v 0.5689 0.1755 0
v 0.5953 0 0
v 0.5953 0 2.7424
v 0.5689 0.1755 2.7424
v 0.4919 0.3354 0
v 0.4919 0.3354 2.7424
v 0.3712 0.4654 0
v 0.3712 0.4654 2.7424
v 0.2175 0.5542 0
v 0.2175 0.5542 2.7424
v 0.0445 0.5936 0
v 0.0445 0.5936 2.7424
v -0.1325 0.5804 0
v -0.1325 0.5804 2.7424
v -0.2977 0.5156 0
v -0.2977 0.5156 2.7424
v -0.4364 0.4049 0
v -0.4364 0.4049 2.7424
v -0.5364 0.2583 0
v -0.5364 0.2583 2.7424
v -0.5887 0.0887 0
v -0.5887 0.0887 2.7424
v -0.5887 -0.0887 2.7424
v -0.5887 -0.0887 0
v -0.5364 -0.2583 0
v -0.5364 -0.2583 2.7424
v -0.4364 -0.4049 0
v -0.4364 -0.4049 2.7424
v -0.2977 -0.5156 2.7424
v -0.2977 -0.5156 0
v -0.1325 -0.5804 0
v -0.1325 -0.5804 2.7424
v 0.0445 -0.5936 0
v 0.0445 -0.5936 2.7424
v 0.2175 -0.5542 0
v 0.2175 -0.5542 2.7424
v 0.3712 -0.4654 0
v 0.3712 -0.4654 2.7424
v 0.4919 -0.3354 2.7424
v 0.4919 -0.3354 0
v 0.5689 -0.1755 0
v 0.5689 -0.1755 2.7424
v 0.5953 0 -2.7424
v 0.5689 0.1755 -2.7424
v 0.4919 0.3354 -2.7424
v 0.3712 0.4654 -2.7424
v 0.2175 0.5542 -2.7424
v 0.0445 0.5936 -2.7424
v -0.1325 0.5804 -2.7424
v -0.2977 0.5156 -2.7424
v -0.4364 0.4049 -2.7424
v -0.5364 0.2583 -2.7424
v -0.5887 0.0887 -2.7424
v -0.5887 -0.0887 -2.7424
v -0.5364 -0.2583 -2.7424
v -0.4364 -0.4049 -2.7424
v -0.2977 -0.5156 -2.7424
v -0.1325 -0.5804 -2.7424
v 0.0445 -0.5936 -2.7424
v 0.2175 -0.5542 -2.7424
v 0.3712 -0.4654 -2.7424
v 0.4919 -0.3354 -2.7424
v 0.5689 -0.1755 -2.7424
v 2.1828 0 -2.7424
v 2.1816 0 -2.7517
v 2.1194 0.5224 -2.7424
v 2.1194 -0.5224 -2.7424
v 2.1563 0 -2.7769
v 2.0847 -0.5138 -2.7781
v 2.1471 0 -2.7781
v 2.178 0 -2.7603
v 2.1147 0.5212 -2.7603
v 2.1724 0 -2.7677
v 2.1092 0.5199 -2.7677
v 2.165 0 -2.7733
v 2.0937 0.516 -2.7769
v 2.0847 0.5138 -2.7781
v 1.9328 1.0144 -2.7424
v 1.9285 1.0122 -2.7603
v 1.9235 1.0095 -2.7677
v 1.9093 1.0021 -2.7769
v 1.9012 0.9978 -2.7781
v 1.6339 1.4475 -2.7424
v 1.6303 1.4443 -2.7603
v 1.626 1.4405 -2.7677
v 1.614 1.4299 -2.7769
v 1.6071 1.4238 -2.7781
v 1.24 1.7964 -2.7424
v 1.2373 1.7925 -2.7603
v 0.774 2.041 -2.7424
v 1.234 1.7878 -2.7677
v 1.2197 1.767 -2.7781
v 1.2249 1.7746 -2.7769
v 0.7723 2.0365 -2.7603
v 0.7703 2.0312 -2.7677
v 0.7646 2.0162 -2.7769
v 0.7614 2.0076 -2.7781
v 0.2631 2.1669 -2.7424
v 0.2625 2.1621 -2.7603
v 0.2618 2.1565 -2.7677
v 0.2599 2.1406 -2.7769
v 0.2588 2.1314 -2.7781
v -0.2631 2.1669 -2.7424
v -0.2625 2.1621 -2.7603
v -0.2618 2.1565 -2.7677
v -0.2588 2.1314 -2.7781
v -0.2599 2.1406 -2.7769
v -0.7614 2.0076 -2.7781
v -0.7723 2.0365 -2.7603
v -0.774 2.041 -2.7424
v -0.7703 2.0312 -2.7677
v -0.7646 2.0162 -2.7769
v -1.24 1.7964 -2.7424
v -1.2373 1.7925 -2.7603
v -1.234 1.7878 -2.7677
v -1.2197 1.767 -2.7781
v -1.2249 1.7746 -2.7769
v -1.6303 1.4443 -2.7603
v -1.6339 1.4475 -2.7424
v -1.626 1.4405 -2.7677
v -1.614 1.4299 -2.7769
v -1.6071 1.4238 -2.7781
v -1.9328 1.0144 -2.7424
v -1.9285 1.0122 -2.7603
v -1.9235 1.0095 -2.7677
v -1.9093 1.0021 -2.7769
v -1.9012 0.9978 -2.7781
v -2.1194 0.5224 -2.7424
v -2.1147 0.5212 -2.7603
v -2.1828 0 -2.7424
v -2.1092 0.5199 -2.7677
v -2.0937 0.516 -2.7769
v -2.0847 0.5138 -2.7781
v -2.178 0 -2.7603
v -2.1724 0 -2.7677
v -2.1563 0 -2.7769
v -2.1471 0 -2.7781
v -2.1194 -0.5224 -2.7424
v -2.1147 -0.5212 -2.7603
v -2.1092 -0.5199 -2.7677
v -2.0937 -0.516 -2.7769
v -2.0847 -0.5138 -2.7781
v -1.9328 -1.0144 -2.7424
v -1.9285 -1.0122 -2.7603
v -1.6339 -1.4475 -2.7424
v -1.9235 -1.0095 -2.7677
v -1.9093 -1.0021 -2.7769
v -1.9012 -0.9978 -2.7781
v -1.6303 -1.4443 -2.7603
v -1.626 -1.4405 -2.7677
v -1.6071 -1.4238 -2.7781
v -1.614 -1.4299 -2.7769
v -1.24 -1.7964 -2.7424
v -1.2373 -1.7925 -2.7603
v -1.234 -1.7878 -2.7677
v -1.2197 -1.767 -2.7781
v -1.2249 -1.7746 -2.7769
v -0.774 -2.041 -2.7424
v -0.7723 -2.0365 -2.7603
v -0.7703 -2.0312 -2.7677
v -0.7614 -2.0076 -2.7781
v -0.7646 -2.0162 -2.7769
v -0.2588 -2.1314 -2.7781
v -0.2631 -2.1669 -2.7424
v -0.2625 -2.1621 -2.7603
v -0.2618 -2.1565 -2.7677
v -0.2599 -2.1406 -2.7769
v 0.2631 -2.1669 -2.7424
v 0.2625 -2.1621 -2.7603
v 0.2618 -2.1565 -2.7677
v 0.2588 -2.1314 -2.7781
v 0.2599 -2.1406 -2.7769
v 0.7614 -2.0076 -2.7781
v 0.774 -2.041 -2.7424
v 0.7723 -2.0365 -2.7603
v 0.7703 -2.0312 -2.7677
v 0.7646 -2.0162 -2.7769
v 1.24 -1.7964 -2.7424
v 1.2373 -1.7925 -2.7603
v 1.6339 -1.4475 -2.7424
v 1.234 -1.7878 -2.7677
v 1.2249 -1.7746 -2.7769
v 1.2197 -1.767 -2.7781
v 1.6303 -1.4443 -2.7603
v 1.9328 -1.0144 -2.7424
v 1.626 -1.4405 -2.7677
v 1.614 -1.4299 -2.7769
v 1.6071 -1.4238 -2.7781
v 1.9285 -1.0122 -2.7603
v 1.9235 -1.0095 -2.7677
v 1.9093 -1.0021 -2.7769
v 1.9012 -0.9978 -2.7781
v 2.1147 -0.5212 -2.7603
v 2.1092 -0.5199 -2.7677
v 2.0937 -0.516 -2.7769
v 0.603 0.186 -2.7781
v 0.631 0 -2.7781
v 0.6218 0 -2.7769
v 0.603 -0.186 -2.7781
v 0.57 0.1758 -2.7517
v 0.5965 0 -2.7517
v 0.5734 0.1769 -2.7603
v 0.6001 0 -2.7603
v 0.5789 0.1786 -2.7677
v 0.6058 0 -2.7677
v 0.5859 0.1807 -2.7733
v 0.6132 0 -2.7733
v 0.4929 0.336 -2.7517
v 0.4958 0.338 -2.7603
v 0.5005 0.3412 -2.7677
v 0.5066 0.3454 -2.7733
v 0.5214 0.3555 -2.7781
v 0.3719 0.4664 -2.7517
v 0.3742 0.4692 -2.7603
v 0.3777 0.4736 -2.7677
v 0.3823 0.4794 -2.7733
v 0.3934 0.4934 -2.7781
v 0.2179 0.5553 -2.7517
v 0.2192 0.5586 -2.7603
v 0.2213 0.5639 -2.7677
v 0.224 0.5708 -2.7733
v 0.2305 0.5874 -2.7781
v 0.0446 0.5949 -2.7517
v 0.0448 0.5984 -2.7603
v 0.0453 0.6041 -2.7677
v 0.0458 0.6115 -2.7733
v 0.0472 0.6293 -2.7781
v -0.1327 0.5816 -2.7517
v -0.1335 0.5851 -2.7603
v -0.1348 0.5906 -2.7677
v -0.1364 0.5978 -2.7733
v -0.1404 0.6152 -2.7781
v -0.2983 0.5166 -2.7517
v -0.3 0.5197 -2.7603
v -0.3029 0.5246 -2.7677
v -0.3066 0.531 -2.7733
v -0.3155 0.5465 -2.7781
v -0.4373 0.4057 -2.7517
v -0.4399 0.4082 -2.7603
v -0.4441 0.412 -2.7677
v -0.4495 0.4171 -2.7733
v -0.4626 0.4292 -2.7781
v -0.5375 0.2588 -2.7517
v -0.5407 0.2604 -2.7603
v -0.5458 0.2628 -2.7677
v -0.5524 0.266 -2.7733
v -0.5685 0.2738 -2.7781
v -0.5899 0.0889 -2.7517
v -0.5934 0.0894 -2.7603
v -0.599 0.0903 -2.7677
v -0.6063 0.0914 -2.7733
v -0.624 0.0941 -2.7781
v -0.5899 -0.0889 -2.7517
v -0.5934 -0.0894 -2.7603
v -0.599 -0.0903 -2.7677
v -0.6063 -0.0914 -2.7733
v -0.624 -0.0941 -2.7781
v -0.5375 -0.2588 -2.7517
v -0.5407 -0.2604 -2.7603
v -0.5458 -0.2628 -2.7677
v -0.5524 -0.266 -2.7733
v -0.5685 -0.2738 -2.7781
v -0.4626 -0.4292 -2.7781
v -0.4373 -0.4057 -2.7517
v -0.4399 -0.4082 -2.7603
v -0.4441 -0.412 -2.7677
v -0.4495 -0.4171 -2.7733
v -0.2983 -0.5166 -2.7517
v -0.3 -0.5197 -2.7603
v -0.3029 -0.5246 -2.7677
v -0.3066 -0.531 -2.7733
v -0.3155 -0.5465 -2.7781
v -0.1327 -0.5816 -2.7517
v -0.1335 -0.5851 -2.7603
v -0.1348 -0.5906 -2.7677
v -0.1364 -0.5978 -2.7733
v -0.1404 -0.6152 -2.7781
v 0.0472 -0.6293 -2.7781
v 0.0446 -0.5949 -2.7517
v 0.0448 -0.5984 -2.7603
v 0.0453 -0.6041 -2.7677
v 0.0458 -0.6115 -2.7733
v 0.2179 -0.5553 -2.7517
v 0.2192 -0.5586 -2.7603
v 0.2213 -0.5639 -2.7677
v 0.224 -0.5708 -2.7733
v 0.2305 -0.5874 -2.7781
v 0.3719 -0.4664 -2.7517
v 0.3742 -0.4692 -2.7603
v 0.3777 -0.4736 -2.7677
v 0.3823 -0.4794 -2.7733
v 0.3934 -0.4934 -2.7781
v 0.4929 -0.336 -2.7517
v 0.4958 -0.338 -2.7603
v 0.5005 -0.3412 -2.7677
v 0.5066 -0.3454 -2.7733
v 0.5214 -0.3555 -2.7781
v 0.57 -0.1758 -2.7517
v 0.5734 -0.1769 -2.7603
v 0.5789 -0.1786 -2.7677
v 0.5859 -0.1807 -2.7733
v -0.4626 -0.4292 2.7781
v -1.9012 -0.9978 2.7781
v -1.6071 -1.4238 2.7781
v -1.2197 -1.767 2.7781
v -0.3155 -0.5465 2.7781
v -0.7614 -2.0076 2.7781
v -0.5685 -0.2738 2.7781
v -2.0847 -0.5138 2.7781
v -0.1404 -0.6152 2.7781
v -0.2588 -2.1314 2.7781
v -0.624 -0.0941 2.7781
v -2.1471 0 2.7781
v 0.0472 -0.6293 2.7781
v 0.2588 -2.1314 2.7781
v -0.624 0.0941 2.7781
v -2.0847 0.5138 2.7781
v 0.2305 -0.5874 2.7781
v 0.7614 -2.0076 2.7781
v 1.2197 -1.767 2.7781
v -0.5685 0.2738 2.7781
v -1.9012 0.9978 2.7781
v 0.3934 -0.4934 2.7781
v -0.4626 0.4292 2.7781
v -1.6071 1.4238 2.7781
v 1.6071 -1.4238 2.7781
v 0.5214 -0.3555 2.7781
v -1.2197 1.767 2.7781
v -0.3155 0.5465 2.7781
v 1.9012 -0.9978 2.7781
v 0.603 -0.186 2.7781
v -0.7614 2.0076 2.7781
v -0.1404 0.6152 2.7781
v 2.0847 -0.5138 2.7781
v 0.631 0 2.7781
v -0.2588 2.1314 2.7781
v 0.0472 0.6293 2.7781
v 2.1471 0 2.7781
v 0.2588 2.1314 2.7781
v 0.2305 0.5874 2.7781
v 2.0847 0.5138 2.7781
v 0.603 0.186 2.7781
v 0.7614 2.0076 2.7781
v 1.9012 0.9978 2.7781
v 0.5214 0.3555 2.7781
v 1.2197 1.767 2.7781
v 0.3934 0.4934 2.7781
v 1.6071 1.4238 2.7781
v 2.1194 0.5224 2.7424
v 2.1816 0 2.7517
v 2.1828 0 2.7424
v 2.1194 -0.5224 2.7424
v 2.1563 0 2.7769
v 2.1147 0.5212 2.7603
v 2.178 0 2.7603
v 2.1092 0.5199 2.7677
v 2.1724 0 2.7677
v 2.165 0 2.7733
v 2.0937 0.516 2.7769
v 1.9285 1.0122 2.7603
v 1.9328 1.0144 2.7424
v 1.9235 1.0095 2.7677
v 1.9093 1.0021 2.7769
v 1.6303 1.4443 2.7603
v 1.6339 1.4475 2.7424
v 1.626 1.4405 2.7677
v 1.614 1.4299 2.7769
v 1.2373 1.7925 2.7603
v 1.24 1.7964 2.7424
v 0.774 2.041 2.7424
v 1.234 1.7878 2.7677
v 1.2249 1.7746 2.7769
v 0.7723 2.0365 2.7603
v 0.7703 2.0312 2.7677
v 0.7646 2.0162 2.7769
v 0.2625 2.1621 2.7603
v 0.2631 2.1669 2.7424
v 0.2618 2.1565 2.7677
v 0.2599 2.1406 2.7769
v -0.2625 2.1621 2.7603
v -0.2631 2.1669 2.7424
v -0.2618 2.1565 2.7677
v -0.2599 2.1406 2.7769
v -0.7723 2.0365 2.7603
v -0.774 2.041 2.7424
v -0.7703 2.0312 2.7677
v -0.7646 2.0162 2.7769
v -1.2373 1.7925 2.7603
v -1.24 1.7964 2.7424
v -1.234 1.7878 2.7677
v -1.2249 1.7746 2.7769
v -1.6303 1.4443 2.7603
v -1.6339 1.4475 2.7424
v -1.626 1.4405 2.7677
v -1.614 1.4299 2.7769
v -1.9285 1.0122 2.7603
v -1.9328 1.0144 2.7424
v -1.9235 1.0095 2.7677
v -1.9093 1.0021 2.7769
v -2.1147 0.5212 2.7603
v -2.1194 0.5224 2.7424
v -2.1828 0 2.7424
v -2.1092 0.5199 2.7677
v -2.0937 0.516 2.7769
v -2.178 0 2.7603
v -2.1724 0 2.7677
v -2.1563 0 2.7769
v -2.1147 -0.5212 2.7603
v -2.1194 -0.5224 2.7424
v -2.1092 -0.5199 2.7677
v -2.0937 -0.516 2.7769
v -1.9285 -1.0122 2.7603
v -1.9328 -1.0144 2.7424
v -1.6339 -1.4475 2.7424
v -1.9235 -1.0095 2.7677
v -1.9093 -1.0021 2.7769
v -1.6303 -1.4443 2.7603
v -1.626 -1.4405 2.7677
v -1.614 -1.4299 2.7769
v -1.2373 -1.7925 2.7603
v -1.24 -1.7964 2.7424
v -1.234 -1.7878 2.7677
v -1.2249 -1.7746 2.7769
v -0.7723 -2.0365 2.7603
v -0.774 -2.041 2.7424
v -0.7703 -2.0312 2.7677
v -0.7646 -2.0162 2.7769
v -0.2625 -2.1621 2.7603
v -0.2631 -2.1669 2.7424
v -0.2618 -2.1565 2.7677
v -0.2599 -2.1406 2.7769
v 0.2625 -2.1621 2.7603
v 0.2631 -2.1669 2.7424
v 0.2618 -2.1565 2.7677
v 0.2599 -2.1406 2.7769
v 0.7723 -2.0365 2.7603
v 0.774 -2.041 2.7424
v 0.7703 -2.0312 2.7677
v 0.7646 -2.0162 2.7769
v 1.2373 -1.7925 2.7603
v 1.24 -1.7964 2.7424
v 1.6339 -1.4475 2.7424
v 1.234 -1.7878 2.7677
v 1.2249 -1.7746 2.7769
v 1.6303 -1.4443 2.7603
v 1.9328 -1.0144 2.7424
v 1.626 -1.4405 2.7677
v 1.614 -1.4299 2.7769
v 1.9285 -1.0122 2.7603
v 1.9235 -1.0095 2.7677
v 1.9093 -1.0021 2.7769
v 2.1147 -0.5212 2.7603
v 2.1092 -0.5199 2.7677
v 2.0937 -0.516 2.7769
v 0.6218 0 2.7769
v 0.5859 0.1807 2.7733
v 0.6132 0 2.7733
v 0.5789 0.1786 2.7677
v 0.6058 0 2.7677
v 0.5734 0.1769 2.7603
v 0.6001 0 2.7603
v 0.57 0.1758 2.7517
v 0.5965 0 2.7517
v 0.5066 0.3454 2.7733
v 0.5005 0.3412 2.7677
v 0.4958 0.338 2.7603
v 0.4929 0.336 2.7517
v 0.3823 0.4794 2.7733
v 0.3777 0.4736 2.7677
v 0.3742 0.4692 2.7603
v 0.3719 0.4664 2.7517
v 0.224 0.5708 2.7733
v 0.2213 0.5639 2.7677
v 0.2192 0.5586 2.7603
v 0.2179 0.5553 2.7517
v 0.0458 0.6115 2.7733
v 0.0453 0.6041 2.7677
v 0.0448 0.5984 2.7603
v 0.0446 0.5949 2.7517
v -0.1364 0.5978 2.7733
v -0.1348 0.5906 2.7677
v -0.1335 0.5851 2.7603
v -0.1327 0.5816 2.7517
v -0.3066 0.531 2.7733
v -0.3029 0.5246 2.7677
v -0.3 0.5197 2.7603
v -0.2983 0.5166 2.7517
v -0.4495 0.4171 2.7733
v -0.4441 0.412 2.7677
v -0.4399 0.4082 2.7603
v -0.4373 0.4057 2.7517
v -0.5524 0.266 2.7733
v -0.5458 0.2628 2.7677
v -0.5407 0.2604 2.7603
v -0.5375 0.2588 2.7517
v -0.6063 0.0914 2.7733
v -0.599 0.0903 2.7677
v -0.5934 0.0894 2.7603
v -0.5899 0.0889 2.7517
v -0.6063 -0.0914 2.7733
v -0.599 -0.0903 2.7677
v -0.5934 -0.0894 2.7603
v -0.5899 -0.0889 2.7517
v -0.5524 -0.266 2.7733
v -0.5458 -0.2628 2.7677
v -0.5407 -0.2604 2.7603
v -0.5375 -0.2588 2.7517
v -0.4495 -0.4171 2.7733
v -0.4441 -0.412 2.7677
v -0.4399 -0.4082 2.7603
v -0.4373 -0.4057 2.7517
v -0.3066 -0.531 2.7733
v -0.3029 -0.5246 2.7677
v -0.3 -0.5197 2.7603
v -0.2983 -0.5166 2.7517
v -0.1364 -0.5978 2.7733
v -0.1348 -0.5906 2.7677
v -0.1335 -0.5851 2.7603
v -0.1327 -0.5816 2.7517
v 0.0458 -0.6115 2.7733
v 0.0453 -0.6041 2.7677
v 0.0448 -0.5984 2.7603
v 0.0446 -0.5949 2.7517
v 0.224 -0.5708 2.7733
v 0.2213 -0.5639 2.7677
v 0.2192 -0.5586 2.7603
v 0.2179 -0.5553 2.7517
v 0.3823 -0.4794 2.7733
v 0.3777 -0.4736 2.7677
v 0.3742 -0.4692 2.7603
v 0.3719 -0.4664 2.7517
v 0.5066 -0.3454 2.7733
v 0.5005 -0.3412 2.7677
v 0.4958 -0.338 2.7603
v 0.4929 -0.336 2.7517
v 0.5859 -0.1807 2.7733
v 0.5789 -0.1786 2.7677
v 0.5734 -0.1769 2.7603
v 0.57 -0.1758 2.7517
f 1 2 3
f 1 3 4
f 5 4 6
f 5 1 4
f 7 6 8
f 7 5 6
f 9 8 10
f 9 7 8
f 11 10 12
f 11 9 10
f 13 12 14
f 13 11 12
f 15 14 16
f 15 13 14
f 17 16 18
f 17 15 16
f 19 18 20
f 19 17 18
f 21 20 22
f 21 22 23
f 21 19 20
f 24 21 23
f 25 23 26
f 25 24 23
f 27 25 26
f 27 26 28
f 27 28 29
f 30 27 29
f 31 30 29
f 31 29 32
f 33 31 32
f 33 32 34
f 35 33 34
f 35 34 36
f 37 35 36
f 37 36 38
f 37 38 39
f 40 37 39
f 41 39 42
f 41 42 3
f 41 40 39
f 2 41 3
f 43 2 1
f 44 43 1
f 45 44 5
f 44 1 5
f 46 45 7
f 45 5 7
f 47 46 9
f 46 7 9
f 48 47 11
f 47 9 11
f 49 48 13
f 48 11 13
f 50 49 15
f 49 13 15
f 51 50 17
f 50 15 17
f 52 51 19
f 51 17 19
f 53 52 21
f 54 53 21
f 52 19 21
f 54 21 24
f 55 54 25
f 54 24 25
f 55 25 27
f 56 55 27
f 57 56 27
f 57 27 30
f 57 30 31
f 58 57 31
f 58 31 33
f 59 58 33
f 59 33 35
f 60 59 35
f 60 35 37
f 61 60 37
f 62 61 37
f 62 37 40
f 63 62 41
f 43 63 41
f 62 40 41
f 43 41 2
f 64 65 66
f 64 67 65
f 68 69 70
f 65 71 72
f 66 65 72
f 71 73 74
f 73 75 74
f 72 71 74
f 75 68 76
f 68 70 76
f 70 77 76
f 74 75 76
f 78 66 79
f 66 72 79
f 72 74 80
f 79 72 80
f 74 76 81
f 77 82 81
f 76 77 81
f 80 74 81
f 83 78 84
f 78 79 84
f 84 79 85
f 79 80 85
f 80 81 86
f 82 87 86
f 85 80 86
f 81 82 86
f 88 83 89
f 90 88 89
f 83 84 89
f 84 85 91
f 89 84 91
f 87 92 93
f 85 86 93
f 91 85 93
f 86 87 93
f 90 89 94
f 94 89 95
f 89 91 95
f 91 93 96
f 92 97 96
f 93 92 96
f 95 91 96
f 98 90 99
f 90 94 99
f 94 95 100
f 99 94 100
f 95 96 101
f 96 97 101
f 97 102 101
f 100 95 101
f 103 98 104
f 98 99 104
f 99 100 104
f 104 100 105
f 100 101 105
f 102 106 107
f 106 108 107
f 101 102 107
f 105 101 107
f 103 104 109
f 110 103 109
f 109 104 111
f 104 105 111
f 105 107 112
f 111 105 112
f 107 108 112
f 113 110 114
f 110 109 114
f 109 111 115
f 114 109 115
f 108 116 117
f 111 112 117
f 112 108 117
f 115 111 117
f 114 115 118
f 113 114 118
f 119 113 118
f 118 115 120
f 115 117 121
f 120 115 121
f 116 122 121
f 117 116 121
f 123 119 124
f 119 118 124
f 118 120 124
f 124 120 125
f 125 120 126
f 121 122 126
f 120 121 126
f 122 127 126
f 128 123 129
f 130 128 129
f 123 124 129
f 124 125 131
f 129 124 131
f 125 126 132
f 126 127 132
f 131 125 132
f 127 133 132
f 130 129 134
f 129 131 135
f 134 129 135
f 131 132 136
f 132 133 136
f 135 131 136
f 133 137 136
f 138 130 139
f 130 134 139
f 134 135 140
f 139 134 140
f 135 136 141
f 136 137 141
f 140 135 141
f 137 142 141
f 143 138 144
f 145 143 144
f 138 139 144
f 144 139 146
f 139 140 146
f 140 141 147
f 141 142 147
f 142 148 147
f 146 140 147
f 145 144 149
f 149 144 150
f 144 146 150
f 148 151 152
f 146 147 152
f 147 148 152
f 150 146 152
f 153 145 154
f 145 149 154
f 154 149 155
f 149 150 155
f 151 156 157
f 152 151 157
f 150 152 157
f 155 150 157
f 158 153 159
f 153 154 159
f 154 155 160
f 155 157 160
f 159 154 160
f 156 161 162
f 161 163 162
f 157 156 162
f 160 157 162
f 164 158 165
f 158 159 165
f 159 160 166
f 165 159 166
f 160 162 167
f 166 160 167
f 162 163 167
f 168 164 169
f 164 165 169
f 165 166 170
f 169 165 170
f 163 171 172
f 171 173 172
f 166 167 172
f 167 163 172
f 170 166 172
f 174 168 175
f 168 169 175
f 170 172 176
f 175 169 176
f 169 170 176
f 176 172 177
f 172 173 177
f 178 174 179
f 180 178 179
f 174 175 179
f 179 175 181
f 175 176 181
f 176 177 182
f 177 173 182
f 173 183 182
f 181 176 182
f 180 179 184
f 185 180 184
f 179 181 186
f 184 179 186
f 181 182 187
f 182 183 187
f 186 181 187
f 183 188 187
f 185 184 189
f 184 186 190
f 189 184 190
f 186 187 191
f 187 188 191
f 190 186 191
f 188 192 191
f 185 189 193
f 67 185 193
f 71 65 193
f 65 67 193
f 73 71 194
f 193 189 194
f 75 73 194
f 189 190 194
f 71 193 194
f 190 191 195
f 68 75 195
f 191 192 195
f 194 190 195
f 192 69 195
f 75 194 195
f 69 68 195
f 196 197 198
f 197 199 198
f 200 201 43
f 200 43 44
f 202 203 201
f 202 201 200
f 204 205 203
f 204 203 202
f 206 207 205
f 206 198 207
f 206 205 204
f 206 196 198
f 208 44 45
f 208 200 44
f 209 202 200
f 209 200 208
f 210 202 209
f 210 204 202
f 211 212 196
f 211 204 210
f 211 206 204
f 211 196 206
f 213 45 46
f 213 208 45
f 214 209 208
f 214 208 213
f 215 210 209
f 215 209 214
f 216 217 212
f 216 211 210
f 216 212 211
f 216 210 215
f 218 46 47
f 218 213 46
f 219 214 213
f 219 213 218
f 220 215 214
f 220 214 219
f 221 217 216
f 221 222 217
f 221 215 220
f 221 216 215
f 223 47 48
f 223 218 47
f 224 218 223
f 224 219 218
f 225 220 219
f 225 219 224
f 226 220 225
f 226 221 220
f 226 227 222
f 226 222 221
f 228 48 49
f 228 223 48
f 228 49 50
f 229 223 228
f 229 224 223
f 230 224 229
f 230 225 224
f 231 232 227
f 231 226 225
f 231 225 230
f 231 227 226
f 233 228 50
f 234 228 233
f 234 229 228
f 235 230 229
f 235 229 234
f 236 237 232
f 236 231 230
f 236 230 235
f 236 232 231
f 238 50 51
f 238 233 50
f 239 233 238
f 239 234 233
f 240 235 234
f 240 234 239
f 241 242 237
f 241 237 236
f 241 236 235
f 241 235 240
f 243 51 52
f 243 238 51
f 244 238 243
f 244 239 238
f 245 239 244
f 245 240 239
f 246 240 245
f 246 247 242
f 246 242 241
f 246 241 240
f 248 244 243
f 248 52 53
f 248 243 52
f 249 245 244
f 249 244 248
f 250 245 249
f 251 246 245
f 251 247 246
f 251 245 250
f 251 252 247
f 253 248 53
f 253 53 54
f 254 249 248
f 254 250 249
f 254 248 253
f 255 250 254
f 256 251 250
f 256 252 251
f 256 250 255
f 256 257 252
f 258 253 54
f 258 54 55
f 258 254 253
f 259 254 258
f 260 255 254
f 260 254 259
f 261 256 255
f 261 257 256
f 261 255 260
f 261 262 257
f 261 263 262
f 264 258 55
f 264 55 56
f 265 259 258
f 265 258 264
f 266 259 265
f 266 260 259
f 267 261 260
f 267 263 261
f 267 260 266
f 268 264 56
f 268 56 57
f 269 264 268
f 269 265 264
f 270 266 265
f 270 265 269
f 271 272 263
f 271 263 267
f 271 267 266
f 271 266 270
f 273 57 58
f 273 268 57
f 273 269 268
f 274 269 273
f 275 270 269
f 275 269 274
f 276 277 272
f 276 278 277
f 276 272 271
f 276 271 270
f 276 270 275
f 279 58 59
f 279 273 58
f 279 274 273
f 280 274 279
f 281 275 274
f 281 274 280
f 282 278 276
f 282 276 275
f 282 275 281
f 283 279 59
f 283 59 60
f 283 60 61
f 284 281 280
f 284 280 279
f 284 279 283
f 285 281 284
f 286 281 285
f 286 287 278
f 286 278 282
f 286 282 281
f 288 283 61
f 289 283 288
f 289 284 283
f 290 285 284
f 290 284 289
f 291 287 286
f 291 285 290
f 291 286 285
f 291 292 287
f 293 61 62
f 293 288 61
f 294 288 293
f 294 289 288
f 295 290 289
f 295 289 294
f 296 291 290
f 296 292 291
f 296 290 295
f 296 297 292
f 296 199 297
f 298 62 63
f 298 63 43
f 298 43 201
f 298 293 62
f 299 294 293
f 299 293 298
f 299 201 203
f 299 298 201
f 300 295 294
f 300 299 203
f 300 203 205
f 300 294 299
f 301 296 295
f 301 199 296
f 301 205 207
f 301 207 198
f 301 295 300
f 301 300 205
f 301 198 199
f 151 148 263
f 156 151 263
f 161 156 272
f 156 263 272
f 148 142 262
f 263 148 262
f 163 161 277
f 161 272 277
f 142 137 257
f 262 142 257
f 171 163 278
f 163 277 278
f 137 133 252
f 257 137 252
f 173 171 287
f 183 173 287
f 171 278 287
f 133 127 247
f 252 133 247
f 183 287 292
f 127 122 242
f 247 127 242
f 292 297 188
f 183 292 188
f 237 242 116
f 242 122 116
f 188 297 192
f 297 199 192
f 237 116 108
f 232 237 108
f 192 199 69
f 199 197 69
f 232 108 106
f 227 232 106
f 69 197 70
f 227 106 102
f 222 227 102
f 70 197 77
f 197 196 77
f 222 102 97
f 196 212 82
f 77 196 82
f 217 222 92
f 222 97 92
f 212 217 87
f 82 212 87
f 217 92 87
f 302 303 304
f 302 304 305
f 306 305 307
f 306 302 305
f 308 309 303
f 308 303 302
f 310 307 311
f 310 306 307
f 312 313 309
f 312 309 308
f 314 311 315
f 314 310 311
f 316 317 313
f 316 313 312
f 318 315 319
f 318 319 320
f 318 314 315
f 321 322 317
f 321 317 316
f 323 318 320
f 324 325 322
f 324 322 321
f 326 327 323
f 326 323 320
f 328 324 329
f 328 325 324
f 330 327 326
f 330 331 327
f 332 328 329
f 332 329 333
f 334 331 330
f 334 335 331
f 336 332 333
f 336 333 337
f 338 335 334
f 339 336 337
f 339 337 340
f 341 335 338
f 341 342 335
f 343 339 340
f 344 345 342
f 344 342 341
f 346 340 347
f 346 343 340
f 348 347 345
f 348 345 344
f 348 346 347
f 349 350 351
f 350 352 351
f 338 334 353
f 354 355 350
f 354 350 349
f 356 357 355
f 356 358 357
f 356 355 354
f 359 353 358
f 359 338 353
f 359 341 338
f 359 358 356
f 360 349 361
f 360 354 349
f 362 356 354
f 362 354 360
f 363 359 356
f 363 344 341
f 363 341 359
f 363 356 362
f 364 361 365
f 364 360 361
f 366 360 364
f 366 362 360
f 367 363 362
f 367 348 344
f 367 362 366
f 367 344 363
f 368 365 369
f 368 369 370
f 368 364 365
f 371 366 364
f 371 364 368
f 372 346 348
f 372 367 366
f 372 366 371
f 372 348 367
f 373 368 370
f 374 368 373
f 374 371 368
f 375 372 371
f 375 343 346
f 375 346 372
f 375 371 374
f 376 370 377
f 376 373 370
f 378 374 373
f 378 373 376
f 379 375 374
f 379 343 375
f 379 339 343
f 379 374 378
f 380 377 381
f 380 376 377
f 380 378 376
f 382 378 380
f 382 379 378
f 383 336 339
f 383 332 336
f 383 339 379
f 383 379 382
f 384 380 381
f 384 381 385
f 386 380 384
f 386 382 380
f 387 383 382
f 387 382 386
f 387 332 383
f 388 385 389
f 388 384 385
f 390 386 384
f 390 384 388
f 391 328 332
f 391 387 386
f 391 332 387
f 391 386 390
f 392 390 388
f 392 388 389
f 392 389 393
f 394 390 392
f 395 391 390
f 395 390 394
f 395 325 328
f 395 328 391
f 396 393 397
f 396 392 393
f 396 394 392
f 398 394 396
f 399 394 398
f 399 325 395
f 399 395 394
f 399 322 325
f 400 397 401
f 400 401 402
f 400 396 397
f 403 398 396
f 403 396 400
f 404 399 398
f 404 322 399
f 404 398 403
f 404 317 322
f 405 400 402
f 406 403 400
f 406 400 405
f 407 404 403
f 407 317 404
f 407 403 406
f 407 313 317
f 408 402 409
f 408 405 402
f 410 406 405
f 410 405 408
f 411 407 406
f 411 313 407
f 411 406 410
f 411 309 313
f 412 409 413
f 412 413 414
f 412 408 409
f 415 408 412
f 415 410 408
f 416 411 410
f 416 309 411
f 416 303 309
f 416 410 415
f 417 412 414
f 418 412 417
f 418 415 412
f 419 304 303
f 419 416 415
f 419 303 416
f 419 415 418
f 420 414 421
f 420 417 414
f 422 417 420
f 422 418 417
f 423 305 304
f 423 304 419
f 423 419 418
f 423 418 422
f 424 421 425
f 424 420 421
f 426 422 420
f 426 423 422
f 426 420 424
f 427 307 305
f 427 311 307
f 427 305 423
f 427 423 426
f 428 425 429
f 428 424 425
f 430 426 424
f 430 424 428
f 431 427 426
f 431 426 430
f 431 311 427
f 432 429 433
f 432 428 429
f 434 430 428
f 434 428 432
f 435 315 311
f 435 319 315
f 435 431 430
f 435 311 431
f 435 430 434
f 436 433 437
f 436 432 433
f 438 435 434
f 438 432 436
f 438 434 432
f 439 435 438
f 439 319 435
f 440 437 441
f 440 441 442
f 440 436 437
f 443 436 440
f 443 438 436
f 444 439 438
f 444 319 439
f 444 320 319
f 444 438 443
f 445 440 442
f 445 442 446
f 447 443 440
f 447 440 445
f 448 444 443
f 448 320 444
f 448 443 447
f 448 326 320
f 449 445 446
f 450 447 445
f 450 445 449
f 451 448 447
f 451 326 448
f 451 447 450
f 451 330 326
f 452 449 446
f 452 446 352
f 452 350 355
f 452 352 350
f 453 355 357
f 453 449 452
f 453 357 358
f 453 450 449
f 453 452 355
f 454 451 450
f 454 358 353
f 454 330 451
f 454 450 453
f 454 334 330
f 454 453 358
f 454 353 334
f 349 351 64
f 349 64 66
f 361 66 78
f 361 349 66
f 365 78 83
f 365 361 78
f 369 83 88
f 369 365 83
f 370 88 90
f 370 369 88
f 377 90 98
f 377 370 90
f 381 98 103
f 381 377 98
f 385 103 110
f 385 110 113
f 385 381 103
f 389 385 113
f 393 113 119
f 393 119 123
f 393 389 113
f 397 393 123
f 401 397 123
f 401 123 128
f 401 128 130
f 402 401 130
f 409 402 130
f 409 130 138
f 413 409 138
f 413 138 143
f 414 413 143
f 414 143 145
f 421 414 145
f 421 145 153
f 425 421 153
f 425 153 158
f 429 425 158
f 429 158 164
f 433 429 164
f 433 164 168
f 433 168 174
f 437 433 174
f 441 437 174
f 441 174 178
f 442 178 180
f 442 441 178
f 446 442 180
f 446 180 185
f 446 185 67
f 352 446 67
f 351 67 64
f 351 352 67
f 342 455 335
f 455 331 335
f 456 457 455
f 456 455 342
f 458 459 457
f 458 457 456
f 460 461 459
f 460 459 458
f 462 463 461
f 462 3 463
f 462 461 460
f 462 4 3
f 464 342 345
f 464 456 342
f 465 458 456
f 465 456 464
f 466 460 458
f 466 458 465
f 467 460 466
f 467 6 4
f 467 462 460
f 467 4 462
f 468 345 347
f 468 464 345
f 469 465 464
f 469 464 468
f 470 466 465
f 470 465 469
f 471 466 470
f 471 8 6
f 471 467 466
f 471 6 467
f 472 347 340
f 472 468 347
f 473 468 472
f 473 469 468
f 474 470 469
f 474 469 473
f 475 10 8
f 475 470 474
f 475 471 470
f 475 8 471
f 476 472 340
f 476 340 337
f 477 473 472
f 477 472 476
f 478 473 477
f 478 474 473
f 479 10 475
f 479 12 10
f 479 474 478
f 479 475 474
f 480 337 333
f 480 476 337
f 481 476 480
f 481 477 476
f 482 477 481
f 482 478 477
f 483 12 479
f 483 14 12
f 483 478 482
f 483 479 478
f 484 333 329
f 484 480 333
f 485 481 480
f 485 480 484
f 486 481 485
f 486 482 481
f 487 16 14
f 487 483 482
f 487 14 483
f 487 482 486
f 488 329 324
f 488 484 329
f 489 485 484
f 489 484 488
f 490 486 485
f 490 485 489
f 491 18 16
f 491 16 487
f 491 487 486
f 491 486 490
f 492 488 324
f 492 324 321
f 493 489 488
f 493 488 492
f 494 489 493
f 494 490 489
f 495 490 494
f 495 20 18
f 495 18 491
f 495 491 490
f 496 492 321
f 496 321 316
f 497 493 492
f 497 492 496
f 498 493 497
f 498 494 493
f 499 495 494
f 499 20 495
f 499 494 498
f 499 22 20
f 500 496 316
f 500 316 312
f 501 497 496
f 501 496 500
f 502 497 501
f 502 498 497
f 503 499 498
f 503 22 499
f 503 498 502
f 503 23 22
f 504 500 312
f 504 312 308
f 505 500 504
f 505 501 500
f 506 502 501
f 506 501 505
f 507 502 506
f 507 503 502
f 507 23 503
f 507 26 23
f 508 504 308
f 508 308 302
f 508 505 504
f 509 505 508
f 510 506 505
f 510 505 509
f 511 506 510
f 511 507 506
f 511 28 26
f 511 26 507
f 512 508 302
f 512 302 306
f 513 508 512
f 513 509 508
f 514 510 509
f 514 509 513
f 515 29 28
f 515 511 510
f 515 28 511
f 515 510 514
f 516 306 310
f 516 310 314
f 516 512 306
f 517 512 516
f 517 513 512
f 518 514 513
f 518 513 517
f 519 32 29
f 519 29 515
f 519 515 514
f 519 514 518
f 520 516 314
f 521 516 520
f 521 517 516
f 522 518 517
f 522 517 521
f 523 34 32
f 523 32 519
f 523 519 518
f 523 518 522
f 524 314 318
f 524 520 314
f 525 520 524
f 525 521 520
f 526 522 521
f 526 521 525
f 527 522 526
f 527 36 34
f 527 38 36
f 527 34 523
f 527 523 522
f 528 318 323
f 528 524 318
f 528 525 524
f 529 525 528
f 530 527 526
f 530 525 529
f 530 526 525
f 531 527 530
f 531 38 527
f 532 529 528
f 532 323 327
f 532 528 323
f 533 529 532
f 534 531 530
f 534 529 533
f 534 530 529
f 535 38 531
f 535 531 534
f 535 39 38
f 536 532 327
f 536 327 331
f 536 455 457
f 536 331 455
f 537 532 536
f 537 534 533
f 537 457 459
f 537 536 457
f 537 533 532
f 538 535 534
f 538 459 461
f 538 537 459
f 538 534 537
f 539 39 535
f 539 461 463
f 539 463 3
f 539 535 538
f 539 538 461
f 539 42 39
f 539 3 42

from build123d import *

# Parameters (mm, degrees)
SKETCH3_R                = 2.1828125
SKETCH3_R_2              = 0.5953125
BOSS_EXTRUDE1_DEPTH      = 2.778125
BOSS_EXTRUDE1_DEPTH_BACK = 2.778125
FILLET1_R                = 0.03571875


with BuildPart() as part:
    # Sketch3 → Boss-Extrude1 (new body, two sides)
    with BuildSketch(Plane.XY) as boss_extrude1_sk:
        Circle(SKETCH3_R)
        Circle(SKETCH3_R_2, mode=Mode.SUBTRACT)
    extrude(amount=BOSS_EXTRUDE1_DEPTH)
    extrude(boss_extrude1_sk.sketch, amount=-BOSS_EXTRUDE1_DEPTH_BACK)

    # Fillet1
    fillet1_edges = [part.edges().sort_by_distance(p)[0] for p in [
        (-2.1828125, 0, 2.778125),
        (-0.5953125, 0, 2.778125),
        (-2.1828125, 0, -2.778125),
        (-0.5953125, 0, -2.778125),
    ]]
    fillet(fillet1_edges, radius=FILLET1_R)


solid = part.part
